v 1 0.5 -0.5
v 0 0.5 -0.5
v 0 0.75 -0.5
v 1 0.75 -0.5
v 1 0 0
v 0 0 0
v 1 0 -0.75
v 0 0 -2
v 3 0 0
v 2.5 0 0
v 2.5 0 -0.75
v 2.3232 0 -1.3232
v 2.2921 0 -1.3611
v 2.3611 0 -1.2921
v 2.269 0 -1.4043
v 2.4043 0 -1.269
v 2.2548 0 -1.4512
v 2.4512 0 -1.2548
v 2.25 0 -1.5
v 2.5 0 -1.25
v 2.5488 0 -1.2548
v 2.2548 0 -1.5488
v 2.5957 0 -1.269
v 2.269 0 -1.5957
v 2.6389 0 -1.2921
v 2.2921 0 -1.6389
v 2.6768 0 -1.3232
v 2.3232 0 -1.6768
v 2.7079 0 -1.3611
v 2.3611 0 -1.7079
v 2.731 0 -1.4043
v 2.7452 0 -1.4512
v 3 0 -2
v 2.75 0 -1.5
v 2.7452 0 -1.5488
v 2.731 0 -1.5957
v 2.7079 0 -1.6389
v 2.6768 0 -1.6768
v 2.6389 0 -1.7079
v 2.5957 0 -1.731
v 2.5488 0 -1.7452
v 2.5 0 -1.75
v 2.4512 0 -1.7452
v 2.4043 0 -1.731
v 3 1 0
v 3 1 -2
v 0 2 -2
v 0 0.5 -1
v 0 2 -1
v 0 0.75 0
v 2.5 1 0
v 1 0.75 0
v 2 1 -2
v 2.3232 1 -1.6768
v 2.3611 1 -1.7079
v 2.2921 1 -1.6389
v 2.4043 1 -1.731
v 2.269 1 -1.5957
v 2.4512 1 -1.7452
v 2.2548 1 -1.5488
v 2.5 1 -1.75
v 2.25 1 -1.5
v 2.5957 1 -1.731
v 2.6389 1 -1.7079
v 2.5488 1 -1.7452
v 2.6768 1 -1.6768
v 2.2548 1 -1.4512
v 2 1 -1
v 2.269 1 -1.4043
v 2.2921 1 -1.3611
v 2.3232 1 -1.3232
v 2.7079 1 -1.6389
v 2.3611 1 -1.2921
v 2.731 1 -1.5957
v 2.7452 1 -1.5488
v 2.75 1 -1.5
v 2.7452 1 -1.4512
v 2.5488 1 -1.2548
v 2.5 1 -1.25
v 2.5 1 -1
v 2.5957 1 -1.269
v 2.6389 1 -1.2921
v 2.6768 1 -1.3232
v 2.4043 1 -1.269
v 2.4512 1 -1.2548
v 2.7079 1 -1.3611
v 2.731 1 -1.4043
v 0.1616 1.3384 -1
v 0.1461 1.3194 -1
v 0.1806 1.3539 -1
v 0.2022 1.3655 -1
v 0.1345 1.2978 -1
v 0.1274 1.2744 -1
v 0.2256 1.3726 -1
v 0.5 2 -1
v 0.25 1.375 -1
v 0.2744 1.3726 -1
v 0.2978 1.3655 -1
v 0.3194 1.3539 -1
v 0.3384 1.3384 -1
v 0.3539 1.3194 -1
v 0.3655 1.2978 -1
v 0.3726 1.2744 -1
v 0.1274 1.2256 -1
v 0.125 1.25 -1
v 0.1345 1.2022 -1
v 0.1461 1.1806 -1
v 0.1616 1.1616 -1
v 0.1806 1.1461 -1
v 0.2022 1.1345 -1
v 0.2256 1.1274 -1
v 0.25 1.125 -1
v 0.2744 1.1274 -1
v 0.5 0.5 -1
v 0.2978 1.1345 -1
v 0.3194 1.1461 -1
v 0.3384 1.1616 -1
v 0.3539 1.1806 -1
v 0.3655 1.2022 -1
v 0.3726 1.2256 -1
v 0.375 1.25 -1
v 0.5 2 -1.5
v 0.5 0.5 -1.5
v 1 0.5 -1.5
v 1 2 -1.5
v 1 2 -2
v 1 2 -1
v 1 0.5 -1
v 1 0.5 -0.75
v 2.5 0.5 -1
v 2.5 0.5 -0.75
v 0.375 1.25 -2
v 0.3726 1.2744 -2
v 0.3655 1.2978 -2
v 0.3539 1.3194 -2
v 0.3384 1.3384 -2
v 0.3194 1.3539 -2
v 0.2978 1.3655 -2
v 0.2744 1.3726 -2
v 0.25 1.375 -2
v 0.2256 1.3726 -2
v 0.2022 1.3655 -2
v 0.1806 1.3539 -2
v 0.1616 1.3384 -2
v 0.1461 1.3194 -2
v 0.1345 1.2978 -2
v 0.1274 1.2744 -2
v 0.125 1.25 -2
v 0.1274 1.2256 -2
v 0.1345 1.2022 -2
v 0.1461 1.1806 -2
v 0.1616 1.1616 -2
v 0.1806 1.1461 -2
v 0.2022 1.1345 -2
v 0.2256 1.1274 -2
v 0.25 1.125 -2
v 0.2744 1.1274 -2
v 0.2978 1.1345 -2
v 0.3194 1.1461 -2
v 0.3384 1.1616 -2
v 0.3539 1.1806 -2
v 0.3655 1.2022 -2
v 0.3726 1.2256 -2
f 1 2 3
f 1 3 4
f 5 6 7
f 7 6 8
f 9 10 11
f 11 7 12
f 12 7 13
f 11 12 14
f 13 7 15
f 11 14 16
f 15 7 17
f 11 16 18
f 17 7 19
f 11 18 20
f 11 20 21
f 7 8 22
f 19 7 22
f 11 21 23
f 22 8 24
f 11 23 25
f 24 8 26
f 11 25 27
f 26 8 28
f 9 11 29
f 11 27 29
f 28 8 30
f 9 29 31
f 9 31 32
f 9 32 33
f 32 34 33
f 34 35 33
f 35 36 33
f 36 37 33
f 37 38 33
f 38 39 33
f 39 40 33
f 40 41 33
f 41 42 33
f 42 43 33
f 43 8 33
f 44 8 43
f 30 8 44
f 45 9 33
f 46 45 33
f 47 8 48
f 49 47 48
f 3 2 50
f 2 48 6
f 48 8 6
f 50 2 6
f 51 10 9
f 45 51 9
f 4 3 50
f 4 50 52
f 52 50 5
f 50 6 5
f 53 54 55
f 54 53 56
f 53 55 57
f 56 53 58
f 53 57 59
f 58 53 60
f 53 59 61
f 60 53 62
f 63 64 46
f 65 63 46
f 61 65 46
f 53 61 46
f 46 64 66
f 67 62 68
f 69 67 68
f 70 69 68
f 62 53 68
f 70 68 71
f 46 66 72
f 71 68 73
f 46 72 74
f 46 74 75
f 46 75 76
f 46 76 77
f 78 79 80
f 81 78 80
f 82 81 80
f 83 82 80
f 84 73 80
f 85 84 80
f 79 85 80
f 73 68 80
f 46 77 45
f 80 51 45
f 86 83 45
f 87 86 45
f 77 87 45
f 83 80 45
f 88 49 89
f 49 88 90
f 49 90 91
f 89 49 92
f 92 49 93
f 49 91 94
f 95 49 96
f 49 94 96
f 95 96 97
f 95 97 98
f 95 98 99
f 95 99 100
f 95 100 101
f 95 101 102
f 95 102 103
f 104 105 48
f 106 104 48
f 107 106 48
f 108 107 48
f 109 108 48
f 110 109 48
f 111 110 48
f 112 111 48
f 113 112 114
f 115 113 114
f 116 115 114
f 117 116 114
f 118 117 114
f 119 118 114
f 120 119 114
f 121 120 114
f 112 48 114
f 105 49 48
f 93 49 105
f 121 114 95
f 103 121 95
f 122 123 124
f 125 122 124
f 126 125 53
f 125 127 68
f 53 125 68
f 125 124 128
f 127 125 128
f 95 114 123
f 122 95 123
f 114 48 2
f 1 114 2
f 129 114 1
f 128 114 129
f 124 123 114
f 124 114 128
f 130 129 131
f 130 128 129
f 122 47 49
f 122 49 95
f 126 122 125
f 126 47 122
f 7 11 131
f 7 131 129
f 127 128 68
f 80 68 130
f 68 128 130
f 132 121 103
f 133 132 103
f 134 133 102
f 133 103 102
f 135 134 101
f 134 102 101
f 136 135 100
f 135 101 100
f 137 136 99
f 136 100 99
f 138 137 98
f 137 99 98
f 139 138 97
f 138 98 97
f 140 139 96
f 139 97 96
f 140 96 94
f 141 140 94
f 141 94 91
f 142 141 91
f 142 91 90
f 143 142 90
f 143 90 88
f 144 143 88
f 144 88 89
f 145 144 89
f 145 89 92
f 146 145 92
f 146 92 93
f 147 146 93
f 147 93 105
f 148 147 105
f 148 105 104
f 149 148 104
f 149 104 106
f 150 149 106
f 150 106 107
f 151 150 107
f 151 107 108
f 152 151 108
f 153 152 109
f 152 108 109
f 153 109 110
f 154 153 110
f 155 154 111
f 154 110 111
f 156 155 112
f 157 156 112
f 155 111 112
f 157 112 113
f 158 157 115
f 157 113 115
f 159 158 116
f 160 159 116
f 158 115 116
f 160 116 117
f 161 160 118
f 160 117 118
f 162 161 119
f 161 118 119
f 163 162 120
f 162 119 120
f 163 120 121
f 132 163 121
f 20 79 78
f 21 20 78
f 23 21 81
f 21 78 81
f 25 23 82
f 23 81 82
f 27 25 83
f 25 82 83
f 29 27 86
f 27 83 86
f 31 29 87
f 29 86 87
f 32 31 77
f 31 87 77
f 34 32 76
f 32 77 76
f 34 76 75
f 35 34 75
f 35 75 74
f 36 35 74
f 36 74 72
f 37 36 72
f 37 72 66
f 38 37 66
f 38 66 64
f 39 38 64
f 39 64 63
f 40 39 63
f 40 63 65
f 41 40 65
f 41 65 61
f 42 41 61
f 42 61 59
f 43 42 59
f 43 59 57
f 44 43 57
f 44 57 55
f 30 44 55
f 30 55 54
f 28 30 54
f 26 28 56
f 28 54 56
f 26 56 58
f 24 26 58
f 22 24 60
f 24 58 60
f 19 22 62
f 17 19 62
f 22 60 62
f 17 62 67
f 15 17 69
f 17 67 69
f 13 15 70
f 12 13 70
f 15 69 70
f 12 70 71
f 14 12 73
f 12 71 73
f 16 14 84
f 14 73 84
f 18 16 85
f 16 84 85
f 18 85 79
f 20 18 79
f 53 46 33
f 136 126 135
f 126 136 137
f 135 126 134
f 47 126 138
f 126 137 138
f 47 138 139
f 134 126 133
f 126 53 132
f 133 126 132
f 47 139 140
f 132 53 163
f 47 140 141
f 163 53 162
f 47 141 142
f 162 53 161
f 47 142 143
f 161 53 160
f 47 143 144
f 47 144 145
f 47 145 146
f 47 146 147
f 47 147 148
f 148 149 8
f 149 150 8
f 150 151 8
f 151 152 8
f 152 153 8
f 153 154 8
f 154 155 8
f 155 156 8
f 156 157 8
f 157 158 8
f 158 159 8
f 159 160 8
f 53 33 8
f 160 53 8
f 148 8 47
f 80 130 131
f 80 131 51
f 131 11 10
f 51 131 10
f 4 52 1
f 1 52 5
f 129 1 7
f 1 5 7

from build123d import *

# Parameters (mm, degrees)
SKETCH1_W               = 3
SKETCH1_H               = 2
BOSS_EXTRUDE1_DEPTH     = 0.5
CUT_EXTRUDE4_DEPTH      = 4.640054945
CUT_EXTRUDE4_DEPTH_BACK = 4.640054945
SKETCH4_6_W             = 1
SKETCH4_6_H             = 0.5
BOSS_EXTRUDE2_DEPTH     = 0.25
BOSS_EXTRUDE3_DEPTH     = 1.5
CUT_EXTRUDE5_DEPTH      = 5.123105626
SKETCH9_R               = 0.25
CUT_EXTRUDE6_DEPTH      = 4.741657387
SKETCH10_R              = 0.125
CUT_EXTRUDE7_DEPTH      = 4.741657387


with BuildPart() as part:
    # Sketch1 → Boss-Extrude1 (new body)
    with BuildSketch(Plane(origin=(0, 0, 0), x_dir=(1, 0, 0), z_dir=(0, 1, 0))):
        with Locations((1.5, 1)):
            Rectangle(SKETCH1_W, SKETCH1_H)
    extrude(amount=BOSS_EXTRUDE1_DEPTH)

    # Sketch4 → Cut-Extrude4 (cut, two sides: drawn at the far end of the back side and taken through both)
    with BuildSketch(Plane(origin=(0, 0.5, 0), x_dir=(1, 0, 0), z_dir=(0, 1, 0)).offset(-CUT_EXTRUDE4_DEPTH_BACK)):
        Polygon((1, 0), (2.5, 0), (2.5, 0.75), (1, 0.75), (1, 0.5), align=None)
    extrude(amount=CUT_EXTRUDE4_DEPTH + CUT_EXTRUDE4_DEPTH_BACK, mode=Mode.SUBTRACT)

    # Sketch4<6> → Boss-Extrude2 (add)
    with BuildSketch(Plane(origin=(0, 0.5, 0), x_dir=(1, 0, 0), z_dir=(0, 1, 0))):
        with Locations((0.5, 0.25)):
            Rectangle(SKETCH4_6_W, SKETCH4_6_H)
    extrude(amount=BOSS_EXTRUDE2_DEPTH)

    # Sketch4<9> → Boss-Extrude3 (add)
    with BuildSketch(Plane(origin=(0, 0.5, 0), x_dir=(1, 0, 0), z_dir=(0, 1, 0))):
        Polygon((0, 2), (0, 1), (0.5, 1), (0.5, 1.5), (1, 1.5), (1, 1), (2.5, 1), (2.5, 0), (3, 0), (3, 2), align=None)
    extrude(amount=BOSS_EXTRUDE3_DEPTH)

    # Sketch8 → Cut-Extrude5 (cut, through all)
    with BuildSketch(Plane.XY):
        Polygon((1, 2), (2, 1), (3, 1), (3, 2), align=None)
    extrude(amount=-CUT_EXTRUDE5_DEPTH, mode=Mode.SUBTRACT)

    # Sketch9 → Cut-Extrude6 (cut, through all)
    with BuildSketch(Plane(origin=(0, 1, 0), x_dir=(1, 0, 0), z_dir=(0, 1, 0))):
        with Locations((2.5, 1.5)):
            Circle(SKETCH9_R)
    extrude(amount=-CUT_EXTRUDE6_DEPTH, mode=Mode.SUBTRACT)

    # Sketch10 → Cut-Extrude7 (cut, through all)
    with BuildSketch(Plane.XY.offset(-1)):
        with Locations((0.25, 1.25)):
            Circle(SKETCH10_R)
    extrude(amount=-CUT_EXTRUDE7_DEPTH, mode=Mode.SUBTRACT)


solid = part.part
